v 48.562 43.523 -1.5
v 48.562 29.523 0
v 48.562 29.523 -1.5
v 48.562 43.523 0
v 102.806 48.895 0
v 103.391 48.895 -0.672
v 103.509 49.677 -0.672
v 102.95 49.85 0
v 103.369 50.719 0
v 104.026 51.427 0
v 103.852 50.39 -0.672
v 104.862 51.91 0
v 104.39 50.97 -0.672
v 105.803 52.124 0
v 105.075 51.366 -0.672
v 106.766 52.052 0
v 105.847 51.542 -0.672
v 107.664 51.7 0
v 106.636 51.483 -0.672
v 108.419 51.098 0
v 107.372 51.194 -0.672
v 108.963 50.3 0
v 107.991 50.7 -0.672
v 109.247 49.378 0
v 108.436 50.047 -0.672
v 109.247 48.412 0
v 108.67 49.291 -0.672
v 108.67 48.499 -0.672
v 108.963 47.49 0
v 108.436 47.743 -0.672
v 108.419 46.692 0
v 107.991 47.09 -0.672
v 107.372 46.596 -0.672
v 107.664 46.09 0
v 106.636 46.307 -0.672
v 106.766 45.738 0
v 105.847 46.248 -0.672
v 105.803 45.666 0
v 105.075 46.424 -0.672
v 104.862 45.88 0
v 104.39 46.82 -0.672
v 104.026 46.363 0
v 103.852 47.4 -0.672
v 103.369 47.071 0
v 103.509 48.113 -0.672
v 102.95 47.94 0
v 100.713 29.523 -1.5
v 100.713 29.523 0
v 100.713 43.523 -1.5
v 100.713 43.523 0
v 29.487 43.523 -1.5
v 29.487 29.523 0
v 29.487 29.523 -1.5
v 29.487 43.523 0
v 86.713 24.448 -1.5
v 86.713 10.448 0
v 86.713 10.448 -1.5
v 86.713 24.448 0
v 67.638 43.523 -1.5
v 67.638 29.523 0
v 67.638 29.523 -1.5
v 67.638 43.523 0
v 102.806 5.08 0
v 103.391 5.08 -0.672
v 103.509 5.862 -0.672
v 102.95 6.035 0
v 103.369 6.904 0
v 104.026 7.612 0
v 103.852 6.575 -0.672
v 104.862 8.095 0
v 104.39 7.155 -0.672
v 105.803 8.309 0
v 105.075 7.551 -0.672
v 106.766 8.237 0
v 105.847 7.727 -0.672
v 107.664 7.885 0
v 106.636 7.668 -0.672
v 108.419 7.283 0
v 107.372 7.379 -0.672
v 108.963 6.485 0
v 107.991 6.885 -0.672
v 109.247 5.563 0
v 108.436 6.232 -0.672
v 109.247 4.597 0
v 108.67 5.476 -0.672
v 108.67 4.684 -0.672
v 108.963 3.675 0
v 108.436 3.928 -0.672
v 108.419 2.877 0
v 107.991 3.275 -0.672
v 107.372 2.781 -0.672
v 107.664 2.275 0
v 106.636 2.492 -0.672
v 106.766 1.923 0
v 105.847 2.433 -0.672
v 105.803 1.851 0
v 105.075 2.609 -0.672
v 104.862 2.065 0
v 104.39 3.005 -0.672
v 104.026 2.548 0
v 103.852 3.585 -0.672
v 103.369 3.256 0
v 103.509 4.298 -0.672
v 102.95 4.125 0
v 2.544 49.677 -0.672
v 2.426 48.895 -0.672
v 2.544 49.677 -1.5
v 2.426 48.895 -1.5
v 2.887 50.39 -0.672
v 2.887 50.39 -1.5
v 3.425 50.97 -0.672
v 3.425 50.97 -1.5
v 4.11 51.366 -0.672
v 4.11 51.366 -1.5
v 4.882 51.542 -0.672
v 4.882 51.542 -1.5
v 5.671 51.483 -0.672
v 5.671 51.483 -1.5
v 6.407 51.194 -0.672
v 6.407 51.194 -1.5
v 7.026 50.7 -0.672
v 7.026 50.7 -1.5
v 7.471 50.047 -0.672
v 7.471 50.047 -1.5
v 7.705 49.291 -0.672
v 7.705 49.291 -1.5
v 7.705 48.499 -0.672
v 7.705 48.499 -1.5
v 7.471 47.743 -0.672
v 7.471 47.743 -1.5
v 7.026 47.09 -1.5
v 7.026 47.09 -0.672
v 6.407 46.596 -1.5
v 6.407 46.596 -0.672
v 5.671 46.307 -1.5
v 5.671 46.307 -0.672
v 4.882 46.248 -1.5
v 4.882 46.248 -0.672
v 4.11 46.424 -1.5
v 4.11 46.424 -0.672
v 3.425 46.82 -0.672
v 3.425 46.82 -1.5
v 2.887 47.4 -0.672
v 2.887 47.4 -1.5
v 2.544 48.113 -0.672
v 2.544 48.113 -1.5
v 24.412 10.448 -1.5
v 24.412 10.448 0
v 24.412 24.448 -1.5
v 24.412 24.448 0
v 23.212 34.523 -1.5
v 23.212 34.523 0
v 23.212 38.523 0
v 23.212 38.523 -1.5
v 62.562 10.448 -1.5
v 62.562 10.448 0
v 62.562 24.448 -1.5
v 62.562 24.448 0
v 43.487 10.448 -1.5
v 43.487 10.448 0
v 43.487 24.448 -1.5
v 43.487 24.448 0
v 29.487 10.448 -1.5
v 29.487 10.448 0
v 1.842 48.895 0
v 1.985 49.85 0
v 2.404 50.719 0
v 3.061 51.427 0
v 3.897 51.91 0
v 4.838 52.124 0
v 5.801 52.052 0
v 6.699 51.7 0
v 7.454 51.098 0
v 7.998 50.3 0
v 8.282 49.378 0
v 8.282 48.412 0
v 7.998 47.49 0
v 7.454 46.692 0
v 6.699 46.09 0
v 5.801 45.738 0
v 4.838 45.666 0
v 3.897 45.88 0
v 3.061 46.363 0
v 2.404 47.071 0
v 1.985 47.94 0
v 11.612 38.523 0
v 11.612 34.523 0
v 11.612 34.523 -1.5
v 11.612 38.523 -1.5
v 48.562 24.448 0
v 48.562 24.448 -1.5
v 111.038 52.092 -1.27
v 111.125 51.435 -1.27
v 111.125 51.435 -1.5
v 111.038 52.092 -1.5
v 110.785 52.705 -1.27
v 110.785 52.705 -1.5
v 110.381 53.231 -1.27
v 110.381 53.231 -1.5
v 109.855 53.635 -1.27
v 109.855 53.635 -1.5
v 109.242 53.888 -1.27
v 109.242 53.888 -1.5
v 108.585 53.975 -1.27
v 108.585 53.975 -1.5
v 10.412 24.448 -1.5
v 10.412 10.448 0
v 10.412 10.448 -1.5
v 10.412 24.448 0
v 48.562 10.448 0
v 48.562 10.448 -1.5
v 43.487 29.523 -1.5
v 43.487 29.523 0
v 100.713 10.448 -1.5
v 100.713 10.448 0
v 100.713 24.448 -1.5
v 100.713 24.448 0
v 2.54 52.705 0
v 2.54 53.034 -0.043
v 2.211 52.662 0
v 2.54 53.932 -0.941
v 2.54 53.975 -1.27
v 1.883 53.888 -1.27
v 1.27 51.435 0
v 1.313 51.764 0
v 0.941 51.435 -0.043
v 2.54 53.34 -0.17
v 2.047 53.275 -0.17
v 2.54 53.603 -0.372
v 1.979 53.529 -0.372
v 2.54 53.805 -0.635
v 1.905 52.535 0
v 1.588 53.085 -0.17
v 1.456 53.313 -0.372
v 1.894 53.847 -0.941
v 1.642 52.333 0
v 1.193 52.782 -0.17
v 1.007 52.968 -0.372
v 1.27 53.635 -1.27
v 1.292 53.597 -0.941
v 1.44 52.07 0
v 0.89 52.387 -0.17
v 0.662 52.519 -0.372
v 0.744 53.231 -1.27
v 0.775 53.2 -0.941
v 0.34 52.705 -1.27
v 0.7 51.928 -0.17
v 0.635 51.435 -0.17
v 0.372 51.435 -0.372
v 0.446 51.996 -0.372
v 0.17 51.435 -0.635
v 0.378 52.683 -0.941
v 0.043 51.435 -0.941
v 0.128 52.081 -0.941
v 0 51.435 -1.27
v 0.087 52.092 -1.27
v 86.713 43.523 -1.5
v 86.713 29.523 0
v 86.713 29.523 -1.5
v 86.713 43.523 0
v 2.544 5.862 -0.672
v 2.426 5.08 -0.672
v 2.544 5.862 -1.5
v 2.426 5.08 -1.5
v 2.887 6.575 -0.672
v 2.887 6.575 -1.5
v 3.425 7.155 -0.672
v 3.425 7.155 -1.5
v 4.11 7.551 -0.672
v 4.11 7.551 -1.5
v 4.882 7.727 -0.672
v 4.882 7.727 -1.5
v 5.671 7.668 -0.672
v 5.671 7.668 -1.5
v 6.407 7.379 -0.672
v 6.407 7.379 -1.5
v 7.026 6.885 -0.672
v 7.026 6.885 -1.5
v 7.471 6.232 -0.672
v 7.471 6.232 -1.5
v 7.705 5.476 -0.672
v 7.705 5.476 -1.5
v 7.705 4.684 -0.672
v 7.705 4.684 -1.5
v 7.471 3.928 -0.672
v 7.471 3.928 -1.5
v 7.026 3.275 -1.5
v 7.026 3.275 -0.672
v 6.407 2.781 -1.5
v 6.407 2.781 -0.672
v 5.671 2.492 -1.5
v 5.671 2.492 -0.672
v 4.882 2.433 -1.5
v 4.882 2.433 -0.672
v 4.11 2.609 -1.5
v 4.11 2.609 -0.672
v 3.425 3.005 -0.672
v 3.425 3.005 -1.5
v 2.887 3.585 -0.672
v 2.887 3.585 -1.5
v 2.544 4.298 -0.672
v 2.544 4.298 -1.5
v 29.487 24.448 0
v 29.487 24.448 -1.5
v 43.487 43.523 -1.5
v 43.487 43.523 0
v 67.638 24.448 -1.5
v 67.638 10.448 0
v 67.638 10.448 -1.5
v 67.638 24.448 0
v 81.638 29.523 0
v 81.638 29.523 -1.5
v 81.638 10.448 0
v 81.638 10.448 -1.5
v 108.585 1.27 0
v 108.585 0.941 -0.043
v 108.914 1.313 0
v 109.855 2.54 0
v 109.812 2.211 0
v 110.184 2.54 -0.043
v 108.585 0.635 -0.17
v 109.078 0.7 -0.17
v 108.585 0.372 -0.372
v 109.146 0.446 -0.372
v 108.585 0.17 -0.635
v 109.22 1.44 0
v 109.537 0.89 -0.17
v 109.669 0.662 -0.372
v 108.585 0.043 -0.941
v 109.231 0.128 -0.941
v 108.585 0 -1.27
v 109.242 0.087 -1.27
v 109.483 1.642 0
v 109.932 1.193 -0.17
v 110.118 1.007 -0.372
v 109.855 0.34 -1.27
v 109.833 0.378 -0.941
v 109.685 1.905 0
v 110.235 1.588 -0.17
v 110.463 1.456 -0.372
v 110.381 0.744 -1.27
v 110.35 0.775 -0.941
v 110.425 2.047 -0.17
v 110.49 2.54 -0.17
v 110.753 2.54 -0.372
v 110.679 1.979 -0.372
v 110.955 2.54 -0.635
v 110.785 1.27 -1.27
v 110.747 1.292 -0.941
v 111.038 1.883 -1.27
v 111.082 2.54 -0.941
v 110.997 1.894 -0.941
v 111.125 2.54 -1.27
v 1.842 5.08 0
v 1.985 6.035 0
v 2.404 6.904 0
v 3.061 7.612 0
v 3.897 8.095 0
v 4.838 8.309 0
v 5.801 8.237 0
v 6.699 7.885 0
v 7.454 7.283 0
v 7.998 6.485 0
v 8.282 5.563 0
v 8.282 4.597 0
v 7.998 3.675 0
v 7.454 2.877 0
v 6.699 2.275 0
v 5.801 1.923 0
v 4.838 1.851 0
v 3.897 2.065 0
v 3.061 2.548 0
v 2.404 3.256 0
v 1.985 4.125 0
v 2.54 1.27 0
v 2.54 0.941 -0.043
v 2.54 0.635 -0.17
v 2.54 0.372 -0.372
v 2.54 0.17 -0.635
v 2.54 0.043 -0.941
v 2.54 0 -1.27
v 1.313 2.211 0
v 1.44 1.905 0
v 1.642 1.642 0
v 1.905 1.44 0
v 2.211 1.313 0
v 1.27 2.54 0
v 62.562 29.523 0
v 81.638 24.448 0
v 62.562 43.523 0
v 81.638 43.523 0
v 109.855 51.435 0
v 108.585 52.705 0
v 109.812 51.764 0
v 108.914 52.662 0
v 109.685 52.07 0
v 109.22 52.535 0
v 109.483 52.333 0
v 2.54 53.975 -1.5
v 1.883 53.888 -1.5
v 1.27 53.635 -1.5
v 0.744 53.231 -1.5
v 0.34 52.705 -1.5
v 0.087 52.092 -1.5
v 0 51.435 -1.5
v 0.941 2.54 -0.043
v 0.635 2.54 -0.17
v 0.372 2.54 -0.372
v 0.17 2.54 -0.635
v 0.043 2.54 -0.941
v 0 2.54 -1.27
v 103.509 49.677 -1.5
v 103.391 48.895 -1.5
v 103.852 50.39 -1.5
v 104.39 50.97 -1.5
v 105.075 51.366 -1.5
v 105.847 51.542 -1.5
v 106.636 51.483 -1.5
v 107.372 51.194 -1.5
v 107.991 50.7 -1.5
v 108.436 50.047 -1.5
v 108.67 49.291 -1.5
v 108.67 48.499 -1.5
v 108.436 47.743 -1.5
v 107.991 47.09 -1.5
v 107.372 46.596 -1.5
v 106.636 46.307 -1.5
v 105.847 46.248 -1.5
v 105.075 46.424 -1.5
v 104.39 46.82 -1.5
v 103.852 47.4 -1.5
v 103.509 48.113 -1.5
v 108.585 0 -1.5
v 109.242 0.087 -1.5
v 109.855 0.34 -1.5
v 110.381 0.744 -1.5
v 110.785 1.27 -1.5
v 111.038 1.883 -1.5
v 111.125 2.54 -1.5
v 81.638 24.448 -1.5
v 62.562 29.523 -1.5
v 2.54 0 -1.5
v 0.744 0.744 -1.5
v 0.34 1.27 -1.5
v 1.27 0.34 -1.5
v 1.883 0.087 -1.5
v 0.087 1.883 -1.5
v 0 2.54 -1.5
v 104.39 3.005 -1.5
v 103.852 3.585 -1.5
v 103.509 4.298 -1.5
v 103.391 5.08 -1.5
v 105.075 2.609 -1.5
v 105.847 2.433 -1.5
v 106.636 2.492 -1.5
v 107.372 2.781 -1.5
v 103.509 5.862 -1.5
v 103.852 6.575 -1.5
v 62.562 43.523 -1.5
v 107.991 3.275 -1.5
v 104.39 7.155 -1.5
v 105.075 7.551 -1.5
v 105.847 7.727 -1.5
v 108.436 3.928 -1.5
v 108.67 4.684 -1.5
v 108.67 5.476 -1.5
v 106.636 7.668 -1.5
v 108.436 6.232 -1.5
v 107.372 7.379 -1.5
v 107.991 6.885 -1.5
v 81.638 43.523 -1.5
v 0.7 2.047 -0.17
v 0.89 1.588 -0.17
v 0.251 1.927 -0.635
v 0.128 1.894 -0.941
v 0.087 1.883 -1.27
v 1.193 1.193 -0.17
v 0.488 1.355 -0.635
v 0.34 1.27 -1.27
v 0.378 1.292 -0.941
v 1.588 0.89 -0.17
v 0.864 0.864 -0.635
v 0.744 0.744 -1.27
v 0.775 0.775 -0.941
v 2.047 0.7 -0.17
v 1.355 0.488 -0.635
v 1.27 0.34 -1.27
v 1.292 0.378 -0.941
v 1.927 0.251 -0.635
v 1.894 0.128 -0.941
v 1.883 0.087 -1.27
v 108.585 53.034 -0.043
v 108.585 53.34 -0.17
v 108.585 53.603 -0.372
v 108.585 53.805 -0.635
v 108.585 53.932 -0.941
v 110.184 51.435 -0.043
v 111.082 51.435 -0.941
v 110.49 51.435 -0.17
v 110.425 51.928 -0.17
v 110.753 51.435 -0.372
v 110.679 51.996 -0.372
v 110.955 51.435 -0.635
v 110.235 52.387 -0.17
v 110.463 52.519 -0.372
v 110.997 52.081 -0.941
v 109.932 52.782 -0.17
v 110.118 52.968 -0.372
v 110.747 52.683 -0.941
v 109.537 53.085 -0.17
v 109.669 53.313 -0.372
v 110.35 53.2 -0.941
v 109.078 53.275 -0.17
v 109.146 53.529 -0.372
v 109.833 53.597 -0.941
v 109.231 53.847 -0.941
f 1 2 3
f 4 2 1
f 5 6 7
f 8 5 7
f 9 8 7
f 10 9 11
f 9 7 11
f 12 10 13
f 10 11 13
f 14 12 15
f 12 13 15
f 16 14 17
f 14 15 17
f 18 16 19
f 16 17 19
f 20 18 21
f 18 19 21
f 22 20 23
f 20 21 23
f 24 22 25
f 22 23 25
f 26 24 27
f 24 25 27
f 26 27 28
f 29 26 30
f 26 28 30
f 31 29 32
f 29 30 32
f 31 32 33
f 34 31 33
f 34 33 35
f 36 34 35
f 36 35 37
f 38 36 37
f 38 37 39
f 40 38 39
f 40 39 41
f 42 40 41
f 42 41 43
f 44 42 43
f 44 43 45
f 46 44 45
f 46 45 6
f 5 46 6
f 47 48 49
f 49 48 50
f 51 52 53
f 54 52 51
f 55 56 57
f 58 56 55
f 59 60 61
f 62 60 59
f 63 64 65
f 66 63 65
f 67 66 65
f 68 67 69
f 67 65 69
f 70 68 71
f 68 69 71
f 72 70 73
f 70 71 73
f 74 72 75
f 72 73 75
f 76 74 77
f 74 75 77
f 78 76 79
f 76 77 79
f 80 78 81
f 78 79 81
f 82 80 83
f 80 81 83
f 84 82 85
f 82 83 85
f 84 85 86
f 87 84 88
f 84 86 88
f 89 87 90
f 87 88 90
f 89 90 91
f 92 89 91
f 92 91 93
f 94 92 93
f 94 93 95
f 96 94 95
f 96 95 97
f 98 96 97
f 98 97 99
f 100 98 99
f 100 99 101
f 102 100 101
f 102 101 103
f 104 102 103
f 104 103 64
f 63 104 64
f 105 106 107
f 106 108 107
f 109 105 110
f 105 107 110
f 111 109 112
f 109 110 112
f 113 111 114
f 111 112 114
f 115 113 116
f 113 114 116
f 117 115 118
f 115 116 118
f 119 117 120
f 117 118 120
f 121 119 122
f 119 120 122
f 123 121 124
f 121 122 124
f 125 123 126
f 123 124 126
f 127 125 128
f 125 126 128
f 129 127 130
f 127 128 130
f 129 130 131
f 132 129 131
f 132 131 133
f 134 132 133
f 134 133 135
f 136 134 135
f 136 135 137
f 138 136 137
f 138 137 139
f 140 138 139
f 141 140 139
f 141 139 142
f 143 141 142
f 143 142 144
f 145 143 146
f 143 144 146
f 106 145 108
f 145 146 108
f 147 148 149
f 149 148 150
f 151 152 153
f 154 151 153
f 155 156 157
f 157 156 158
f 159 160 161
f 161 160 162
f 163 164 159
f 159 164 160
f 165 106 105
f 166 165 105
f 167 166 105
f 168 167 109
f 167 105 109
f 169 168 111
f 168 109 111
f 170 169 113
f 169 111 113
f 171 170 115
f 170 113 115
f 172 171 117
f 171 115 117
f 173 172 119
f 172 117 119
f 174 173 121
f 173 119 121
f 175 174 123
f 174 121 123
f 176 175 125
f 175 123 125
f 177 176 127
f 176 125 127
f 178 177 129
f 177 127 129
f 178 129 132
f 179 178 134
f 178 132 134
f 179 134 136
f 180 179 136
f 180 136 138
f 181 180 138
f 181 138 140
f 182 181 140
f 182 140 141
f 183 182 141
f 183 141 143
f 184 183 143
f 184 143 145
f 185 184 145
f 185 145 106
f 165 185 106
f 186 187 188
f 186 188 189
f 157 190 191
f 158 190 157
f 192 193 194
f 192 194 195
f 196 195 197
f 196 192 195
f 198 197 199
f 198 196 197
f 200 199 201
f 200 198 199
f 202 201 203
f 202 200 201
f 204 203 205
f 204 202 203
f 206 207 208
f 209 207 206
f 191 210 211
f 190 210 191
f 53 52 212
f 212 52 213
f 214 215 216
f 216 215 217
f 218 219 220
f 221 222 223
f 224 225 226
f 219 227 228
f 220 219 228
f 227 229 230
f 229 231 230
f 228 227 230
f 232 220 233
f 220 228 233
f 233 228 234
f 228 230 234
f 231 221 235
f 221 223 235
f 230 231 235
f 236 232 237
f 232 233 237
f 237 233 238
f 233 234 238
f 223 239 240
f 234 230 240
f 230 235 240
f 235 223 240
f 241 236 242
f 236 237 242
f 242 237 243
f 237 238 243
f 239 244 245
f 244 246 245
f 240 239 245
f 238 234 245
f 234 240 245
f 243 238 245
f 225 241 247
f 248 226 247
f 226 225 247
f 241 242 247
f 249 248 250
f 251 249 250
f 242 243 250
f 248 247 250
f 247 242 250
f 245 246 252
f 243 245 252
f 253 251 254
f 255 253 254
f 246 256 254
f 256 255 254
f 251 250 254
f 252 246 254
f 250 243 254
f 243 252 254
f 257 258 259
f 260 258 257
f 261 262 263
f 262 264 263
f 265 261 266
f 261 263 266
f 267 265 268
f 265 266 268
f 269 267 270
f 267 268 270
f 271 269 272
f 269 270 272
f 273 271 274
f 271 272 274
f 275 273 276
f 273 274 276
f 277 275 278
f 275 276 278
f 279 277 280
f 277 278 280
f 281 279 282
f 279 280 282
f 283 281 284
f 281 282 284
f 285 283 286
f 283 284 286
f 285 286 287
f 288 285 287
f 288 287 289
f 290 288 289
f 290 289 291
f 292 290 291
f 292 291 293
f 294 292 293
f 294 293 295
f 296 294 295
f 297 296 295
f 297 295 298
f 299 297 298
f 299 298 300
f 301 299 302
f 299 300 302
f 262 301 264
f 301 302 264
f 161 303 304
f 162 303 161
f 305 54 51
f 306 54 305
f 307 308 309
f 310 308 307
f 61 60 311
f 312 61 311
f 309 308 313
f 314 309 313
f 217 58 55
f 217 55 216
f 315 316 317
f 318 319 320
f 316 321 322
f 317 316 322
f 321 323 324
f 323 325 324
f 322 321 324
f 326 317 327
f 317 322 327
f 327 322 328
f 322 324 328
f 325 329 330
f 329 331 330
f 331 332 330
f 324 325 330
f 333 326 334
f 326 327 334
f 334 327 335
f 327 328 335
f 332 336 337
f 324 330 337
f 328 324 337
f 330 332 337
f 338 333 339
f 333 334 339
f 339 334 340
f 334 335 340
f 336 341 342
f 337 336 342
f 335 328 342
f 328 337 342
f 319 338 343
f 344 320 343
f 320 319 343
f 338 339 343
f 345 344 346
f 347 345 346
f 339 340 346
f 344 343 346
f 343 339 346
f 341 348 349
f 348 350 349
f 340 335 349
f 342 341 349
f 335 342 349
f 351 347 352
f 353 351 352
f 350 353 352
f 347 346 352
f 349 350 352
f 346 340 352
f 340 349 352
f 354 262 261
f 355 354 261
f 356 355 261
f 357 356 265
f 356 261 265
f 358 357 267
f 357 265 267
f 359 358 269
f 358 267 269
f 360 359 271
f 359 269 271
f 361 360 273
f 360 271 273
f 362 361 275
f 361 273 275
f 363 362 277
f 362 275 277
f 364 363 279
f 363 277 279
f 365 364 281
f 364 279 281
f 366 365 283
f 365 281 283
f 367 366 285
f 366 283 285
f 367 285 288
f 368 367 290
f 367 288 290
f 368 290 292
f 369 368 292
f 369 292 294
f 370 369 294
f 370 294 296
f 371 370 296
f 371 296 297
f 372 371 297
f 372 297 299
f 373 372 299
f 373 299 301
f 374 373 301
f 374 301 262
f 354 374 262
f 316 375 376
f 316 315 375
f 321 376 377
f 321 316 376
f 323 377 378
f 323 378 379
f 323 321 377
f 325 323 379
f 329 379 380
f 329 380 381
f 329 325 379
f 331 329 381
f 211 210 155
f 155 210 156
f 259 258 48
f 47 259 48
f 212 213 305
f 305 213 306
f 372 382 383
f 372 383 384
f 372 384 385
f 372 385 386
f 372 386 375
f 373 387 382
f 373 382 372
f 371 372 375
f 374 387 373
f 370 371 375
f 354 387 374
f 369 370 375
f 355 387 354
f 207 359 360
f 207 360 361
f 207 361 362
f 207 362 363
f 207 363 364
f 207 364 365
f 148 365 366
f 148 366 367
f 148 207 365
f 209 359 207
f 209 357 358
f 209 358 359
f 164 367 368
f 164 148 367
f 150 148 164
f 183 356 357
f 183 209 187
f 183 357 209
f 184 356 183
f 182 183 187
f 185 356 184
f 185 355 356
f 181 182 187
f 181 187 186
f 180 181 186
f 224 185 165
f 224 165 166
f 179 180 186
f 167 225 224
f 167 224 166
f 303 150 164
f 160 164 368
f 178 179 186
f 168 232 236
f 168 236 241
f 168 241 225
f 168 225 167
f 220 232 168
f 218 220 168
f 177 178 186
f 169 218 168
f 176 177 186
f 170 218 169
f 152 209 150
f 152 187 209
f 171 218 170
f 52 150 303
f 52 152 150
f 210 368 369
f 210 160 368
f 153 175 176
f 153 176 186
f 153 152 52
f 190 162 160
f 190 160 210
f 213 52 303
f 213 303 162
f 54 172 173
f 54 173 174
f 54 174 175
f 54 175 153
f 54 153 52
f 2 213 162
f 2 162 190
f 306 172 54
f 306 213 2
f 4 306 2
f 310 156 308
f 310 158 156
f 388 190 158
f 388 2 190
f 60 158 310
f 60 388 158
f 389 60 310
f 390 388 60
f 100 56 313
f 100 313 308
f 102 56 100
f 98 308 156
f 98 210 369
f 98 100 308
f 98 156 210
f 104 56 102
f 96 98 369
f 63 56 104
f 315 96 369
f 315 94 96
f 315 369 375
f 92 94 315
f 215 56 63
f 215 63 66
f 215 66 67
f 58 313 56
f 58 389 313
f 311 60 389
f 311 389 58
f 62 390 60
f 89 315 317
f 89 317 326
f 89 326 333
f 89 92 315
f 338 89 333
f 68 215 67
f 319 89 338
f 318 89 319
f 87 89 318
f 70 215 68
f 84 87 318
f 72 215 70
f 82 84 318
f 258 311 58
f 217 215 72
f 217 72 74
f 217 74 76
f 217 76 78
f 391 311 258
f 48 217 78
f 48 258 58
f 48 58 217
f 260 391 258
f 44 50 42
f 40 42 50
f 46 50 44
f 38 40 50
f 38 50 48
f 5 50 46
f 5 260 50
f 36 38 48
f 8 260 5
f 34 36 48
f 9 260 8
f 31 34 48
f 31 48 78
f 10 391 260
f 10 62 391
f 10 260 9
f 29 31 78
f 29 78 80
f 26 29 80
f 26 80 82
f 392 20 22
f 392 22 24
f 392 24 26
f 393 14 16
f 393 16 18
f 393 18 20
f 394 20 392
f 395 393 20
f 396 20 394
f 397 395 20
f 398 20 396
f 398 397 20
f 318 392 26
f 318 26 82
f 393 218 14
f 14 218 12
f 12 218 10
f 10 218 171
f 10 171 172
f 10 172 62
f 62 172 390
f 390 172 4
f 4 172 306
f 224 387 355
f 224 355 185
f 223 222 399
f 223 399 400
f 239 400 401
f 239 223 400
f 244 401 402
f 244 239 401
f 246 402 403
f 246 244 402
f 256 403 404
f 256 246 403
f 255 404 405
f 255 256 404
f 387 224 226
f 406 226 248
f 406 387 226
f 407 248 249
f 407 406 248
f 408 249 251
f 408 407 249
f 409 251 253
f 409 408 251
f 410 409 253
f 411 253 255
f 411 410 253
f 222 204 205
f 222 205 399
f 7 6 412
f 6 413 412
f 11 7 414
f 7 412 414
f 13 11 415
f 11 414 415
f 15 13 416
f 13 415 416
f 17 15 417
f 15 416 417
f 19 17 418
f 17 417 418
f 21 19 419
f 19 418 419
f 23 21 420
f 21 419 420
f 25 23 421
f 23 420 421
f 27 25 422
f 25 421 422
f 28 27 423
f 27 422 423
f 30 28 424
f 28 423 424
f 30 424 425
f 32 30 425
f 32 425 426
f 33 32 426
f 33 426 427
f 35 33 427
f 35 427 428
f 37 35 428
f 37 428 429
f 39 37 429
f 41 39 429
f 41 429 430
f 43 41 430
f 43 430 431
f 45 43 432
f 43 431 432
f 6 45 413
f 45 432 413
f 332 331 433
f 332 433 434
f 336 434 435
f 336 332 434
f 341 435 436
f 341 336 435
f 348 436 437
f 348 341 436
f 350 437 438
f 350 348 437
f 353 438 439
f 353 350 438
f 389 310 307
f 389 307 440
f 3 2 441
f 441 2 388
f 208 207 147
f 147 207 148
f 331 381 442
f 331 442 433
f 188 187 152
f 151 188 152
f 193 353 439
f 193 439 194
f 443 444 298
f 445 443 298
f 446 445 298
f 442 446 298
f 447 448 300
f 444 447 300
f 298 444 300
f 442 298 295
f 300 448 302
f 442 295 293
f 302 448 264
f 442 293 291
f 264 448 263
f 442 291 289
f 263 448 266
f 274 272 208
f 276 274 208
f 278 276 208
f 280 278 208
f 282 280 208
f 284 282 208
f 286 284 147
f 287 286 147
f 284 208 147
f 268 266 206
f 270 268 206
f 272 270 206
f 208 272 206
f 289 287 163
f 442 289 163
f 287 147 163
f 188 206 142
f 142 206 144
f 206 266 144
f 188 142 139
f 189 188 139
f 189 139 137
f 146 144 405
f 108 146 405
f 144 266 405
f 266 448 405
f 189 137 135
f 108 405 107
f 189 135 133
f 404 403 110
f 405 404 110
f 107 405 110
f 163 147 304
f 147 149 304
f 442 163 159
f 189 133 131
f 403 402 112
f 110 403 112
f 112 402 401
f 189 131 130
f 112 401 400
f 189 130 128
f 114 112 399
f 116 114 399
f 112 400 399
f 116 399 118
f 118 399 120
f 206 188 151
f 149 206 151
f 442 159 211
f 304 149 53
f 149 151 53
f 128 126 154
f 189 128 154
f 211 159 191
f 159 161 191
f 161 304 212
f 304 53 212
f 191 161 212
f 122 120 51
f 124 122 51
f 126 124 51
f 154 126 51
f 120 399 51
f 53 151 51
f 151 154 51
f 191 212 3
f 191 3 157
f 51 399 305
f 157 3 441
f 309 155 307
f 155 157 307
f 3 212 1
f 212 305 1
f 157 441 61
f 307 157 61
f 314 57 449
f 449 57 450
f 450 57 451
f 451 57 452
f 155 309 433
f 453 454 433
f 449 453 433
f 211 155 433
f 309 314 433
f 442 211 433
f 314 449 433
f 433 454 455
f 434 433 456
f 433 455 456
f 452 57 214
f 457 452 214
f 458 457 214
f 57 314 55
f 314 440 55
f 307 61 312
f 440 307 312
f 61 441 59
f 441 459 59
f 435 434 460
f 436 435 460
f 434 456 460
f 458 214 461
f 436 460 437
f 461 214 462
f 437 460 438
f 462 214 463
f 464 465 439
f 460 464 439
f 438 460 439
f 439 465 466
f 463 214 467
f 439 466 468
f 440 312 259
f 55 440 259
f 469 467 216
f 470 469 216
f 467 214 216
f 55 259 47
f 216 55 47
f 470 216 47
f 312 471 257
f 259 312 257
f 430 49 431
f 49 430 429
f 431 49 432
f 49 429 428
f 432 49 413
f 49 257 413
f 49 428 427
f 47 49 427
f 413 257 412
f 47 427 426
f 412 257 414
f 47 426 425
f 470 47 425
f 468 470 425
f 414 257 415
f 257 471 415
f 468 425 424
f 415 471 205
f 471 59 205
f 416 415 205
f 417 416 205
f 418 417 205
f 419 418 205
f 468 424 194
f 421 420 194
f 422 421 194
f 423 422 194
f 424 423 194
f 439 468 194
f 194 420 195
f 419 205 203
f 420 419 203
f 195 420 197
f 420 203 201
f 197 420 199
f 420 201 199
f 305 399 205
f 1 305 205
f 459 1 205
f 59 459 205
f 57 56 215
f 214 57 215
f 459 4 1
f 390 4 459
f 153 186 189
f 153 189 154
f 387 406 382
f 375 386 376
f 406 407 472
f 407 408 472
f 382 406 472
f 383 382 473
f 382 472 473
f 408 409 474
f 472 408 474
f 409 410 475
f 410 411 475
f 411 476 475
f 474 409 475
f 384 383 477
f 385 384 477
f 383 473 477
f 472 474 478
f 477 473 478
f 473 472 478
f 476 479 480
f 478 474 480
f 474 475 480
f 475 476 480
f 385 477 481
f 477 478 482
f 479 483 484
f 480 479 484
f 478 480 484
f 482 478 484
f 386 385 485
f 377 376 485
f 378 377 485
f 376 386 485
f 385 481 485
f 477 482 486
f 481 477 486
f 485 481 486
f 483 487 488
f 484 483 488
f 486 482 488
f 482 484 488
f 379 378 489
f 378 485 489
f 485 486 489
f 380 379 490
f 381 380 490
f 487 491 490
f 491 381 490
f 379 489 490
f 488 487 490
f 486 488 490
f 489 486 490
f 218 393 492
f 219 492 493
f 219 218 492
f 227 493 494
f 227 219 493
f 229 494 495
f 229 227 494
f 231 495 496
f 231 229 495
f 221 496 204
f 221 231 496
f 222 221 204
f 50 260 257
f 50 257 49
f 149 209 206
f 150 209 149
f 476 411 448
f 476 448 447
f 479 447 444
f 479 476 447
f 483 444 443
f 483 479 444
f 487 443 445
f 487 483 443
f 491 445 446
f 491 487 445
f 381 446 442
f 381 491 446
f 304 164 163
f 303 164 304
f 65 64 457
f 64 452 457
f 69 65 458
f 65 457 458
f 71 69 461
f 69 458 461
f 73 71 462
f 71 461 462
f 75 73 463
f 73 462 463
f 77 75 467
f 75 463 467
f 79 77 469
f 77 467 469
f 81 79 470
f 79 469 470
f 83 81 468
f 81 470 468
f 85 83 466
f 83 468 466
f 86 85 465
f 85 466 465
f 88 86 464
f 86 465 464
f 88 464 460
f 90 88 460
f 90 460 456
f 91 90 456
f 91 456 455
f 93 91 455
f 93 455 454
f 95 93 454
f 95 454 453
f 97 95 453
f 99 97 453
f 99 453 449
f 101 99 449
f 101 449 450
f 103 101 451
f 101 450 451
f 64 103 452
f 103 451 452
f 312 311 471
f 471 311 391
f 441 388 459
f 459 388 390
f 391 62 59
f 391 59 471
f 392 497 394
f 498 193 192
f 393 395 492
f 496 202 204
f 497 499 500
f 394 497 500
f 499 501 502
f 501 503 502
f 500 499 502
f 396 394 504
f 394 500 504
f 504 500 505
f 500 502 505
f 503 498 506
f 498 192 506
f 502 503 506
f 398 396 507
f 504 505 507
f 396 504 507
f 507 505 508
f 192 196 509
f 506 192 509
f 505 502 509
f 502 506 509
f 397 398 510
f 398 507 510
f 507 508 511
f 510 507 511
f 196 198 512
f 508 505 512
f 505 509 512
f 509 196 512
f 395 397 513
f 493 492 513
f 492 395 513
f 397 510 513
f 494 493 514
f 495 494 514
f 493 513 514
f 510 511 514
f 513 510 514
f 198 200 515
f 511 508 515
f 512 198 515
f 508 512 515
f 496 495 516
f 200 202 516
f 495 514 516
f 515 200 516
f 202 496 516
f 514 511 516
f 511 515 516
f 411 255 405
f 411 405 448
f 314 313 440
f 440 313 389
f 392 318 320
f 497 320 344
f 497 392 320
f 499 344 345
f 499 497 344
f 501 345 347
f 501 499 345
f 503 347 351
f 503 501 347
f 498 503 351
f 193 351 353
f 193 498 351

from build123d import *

# Parameters (mm, degrees)
F0_W           = 14
F0_H           = 14
F0_W_2         = 11.6
F0_H_2         = 4
F1_DEPTH       = 1.5
F2_D           = 5.3086
F2_CSINK_D     = 6.477
F2_CSINK_ANGLE = 82
F3_R           = 1.27


with BuildPart() as f1:
    # F0 (on Top) → F1 (new body)
    with BuildSketch(Plane.XY):
        with BuildLine():
            ThreePointArc((0, 2.54), (0.7439487758, 0.7439487758), (2.54, 0))
            Line((2.54, 0), (108.585, 0))
            ThreePointArc((108.585, 0), (110.3810512242, 0.7439487758), (111.125, 2.54))
            Line((111.125, 2.54), (111.125, 51.435))
            ThreePointArc((111.125, 51.435), (110.3810512242, 53.2310512242), (108.585, 53.975))
            Line((108.585, 53.975), (2.54, 53.975))
            ThreePointArc((2.54, 53.975), (0.7439487758, 53.2310512242), (0, 51.435))
            Line((0, 51.435), (0, 2.54))
        make_face()
        with Locations((17.4117, 17.4475)):
            Rectangle(F0_W, F0_H, mode=Mode.SUBTRACT)
        with Locations((36.4871, 17.4475)):
            Rectangle(F0_W, F0_H, mode=Mode.SUBTRACT)
        with Locations((55.5625, 17.4475)):
            Rectangle(F0_W, F0_H, mode=Mode.SUBTRACT)
        with Locations((74.6379, 17.4475)):
            Rectangle(F0_W, F0_H, mode=Mode.SUBTRACT)
        with Locations((93.7133, 17.4475)):
            Rectangle(F0_W, F0_H, mode=Mode.SUBTRACT)
        with Locations((17.4117, 36.5229)):
            Rectangle(F0_W_2, F0_H_2, mode=Mode.SUBTRACT)
        with Locations((36.4871, 36.5229)):
            Rectangle(F0_W, F0_H, mode=Mode.SUBTRACT)
        with Locations((55.5625, 36.5229)):
            Rectangle(F0_W, F0_H, mode=Mode.SUBTRACT)
        with Locations((74.6379, 36.5229)):
            Rectangle(F0_W, F0_H, mode=Mode.SUBTRACT)
        with Locations((93.7133, 36.5229)):
            Rectangle(F0_W, F0_H, mode=Mode.SUBTRACT)
    extrude(amount=-F1_DEPTH)

    # F2 (through all)
    with Locations(Plane.XY):
        with Locations((5.08, 48.895), (5.08, 5.08), (106.045, 5.08), (106.045, 48.895)):
            CounterSinkHole(F2_D / 2, F2_CSINK_D / 2, counter_sink_angle=F2_CSINK_ANGLE)

    # F3
    f3_edges = [f1.edges().sort_by_distance(p)[0] for p in [
        (55.5625, 0, 0),
        (111.125, 26.9875, 0),
        (110.381051, 0.743949, 0),
        (110.381051, 53.231051, 0),
        (55.5625, 53.975, 0),
        (0.743949, 53.231051, 0),
        (0, 26.9875, 0),
        (0.743949, 0.743949, 0),
    ]]
    fillet(f3_edges, radius=F3_R)


solid = f1.part
